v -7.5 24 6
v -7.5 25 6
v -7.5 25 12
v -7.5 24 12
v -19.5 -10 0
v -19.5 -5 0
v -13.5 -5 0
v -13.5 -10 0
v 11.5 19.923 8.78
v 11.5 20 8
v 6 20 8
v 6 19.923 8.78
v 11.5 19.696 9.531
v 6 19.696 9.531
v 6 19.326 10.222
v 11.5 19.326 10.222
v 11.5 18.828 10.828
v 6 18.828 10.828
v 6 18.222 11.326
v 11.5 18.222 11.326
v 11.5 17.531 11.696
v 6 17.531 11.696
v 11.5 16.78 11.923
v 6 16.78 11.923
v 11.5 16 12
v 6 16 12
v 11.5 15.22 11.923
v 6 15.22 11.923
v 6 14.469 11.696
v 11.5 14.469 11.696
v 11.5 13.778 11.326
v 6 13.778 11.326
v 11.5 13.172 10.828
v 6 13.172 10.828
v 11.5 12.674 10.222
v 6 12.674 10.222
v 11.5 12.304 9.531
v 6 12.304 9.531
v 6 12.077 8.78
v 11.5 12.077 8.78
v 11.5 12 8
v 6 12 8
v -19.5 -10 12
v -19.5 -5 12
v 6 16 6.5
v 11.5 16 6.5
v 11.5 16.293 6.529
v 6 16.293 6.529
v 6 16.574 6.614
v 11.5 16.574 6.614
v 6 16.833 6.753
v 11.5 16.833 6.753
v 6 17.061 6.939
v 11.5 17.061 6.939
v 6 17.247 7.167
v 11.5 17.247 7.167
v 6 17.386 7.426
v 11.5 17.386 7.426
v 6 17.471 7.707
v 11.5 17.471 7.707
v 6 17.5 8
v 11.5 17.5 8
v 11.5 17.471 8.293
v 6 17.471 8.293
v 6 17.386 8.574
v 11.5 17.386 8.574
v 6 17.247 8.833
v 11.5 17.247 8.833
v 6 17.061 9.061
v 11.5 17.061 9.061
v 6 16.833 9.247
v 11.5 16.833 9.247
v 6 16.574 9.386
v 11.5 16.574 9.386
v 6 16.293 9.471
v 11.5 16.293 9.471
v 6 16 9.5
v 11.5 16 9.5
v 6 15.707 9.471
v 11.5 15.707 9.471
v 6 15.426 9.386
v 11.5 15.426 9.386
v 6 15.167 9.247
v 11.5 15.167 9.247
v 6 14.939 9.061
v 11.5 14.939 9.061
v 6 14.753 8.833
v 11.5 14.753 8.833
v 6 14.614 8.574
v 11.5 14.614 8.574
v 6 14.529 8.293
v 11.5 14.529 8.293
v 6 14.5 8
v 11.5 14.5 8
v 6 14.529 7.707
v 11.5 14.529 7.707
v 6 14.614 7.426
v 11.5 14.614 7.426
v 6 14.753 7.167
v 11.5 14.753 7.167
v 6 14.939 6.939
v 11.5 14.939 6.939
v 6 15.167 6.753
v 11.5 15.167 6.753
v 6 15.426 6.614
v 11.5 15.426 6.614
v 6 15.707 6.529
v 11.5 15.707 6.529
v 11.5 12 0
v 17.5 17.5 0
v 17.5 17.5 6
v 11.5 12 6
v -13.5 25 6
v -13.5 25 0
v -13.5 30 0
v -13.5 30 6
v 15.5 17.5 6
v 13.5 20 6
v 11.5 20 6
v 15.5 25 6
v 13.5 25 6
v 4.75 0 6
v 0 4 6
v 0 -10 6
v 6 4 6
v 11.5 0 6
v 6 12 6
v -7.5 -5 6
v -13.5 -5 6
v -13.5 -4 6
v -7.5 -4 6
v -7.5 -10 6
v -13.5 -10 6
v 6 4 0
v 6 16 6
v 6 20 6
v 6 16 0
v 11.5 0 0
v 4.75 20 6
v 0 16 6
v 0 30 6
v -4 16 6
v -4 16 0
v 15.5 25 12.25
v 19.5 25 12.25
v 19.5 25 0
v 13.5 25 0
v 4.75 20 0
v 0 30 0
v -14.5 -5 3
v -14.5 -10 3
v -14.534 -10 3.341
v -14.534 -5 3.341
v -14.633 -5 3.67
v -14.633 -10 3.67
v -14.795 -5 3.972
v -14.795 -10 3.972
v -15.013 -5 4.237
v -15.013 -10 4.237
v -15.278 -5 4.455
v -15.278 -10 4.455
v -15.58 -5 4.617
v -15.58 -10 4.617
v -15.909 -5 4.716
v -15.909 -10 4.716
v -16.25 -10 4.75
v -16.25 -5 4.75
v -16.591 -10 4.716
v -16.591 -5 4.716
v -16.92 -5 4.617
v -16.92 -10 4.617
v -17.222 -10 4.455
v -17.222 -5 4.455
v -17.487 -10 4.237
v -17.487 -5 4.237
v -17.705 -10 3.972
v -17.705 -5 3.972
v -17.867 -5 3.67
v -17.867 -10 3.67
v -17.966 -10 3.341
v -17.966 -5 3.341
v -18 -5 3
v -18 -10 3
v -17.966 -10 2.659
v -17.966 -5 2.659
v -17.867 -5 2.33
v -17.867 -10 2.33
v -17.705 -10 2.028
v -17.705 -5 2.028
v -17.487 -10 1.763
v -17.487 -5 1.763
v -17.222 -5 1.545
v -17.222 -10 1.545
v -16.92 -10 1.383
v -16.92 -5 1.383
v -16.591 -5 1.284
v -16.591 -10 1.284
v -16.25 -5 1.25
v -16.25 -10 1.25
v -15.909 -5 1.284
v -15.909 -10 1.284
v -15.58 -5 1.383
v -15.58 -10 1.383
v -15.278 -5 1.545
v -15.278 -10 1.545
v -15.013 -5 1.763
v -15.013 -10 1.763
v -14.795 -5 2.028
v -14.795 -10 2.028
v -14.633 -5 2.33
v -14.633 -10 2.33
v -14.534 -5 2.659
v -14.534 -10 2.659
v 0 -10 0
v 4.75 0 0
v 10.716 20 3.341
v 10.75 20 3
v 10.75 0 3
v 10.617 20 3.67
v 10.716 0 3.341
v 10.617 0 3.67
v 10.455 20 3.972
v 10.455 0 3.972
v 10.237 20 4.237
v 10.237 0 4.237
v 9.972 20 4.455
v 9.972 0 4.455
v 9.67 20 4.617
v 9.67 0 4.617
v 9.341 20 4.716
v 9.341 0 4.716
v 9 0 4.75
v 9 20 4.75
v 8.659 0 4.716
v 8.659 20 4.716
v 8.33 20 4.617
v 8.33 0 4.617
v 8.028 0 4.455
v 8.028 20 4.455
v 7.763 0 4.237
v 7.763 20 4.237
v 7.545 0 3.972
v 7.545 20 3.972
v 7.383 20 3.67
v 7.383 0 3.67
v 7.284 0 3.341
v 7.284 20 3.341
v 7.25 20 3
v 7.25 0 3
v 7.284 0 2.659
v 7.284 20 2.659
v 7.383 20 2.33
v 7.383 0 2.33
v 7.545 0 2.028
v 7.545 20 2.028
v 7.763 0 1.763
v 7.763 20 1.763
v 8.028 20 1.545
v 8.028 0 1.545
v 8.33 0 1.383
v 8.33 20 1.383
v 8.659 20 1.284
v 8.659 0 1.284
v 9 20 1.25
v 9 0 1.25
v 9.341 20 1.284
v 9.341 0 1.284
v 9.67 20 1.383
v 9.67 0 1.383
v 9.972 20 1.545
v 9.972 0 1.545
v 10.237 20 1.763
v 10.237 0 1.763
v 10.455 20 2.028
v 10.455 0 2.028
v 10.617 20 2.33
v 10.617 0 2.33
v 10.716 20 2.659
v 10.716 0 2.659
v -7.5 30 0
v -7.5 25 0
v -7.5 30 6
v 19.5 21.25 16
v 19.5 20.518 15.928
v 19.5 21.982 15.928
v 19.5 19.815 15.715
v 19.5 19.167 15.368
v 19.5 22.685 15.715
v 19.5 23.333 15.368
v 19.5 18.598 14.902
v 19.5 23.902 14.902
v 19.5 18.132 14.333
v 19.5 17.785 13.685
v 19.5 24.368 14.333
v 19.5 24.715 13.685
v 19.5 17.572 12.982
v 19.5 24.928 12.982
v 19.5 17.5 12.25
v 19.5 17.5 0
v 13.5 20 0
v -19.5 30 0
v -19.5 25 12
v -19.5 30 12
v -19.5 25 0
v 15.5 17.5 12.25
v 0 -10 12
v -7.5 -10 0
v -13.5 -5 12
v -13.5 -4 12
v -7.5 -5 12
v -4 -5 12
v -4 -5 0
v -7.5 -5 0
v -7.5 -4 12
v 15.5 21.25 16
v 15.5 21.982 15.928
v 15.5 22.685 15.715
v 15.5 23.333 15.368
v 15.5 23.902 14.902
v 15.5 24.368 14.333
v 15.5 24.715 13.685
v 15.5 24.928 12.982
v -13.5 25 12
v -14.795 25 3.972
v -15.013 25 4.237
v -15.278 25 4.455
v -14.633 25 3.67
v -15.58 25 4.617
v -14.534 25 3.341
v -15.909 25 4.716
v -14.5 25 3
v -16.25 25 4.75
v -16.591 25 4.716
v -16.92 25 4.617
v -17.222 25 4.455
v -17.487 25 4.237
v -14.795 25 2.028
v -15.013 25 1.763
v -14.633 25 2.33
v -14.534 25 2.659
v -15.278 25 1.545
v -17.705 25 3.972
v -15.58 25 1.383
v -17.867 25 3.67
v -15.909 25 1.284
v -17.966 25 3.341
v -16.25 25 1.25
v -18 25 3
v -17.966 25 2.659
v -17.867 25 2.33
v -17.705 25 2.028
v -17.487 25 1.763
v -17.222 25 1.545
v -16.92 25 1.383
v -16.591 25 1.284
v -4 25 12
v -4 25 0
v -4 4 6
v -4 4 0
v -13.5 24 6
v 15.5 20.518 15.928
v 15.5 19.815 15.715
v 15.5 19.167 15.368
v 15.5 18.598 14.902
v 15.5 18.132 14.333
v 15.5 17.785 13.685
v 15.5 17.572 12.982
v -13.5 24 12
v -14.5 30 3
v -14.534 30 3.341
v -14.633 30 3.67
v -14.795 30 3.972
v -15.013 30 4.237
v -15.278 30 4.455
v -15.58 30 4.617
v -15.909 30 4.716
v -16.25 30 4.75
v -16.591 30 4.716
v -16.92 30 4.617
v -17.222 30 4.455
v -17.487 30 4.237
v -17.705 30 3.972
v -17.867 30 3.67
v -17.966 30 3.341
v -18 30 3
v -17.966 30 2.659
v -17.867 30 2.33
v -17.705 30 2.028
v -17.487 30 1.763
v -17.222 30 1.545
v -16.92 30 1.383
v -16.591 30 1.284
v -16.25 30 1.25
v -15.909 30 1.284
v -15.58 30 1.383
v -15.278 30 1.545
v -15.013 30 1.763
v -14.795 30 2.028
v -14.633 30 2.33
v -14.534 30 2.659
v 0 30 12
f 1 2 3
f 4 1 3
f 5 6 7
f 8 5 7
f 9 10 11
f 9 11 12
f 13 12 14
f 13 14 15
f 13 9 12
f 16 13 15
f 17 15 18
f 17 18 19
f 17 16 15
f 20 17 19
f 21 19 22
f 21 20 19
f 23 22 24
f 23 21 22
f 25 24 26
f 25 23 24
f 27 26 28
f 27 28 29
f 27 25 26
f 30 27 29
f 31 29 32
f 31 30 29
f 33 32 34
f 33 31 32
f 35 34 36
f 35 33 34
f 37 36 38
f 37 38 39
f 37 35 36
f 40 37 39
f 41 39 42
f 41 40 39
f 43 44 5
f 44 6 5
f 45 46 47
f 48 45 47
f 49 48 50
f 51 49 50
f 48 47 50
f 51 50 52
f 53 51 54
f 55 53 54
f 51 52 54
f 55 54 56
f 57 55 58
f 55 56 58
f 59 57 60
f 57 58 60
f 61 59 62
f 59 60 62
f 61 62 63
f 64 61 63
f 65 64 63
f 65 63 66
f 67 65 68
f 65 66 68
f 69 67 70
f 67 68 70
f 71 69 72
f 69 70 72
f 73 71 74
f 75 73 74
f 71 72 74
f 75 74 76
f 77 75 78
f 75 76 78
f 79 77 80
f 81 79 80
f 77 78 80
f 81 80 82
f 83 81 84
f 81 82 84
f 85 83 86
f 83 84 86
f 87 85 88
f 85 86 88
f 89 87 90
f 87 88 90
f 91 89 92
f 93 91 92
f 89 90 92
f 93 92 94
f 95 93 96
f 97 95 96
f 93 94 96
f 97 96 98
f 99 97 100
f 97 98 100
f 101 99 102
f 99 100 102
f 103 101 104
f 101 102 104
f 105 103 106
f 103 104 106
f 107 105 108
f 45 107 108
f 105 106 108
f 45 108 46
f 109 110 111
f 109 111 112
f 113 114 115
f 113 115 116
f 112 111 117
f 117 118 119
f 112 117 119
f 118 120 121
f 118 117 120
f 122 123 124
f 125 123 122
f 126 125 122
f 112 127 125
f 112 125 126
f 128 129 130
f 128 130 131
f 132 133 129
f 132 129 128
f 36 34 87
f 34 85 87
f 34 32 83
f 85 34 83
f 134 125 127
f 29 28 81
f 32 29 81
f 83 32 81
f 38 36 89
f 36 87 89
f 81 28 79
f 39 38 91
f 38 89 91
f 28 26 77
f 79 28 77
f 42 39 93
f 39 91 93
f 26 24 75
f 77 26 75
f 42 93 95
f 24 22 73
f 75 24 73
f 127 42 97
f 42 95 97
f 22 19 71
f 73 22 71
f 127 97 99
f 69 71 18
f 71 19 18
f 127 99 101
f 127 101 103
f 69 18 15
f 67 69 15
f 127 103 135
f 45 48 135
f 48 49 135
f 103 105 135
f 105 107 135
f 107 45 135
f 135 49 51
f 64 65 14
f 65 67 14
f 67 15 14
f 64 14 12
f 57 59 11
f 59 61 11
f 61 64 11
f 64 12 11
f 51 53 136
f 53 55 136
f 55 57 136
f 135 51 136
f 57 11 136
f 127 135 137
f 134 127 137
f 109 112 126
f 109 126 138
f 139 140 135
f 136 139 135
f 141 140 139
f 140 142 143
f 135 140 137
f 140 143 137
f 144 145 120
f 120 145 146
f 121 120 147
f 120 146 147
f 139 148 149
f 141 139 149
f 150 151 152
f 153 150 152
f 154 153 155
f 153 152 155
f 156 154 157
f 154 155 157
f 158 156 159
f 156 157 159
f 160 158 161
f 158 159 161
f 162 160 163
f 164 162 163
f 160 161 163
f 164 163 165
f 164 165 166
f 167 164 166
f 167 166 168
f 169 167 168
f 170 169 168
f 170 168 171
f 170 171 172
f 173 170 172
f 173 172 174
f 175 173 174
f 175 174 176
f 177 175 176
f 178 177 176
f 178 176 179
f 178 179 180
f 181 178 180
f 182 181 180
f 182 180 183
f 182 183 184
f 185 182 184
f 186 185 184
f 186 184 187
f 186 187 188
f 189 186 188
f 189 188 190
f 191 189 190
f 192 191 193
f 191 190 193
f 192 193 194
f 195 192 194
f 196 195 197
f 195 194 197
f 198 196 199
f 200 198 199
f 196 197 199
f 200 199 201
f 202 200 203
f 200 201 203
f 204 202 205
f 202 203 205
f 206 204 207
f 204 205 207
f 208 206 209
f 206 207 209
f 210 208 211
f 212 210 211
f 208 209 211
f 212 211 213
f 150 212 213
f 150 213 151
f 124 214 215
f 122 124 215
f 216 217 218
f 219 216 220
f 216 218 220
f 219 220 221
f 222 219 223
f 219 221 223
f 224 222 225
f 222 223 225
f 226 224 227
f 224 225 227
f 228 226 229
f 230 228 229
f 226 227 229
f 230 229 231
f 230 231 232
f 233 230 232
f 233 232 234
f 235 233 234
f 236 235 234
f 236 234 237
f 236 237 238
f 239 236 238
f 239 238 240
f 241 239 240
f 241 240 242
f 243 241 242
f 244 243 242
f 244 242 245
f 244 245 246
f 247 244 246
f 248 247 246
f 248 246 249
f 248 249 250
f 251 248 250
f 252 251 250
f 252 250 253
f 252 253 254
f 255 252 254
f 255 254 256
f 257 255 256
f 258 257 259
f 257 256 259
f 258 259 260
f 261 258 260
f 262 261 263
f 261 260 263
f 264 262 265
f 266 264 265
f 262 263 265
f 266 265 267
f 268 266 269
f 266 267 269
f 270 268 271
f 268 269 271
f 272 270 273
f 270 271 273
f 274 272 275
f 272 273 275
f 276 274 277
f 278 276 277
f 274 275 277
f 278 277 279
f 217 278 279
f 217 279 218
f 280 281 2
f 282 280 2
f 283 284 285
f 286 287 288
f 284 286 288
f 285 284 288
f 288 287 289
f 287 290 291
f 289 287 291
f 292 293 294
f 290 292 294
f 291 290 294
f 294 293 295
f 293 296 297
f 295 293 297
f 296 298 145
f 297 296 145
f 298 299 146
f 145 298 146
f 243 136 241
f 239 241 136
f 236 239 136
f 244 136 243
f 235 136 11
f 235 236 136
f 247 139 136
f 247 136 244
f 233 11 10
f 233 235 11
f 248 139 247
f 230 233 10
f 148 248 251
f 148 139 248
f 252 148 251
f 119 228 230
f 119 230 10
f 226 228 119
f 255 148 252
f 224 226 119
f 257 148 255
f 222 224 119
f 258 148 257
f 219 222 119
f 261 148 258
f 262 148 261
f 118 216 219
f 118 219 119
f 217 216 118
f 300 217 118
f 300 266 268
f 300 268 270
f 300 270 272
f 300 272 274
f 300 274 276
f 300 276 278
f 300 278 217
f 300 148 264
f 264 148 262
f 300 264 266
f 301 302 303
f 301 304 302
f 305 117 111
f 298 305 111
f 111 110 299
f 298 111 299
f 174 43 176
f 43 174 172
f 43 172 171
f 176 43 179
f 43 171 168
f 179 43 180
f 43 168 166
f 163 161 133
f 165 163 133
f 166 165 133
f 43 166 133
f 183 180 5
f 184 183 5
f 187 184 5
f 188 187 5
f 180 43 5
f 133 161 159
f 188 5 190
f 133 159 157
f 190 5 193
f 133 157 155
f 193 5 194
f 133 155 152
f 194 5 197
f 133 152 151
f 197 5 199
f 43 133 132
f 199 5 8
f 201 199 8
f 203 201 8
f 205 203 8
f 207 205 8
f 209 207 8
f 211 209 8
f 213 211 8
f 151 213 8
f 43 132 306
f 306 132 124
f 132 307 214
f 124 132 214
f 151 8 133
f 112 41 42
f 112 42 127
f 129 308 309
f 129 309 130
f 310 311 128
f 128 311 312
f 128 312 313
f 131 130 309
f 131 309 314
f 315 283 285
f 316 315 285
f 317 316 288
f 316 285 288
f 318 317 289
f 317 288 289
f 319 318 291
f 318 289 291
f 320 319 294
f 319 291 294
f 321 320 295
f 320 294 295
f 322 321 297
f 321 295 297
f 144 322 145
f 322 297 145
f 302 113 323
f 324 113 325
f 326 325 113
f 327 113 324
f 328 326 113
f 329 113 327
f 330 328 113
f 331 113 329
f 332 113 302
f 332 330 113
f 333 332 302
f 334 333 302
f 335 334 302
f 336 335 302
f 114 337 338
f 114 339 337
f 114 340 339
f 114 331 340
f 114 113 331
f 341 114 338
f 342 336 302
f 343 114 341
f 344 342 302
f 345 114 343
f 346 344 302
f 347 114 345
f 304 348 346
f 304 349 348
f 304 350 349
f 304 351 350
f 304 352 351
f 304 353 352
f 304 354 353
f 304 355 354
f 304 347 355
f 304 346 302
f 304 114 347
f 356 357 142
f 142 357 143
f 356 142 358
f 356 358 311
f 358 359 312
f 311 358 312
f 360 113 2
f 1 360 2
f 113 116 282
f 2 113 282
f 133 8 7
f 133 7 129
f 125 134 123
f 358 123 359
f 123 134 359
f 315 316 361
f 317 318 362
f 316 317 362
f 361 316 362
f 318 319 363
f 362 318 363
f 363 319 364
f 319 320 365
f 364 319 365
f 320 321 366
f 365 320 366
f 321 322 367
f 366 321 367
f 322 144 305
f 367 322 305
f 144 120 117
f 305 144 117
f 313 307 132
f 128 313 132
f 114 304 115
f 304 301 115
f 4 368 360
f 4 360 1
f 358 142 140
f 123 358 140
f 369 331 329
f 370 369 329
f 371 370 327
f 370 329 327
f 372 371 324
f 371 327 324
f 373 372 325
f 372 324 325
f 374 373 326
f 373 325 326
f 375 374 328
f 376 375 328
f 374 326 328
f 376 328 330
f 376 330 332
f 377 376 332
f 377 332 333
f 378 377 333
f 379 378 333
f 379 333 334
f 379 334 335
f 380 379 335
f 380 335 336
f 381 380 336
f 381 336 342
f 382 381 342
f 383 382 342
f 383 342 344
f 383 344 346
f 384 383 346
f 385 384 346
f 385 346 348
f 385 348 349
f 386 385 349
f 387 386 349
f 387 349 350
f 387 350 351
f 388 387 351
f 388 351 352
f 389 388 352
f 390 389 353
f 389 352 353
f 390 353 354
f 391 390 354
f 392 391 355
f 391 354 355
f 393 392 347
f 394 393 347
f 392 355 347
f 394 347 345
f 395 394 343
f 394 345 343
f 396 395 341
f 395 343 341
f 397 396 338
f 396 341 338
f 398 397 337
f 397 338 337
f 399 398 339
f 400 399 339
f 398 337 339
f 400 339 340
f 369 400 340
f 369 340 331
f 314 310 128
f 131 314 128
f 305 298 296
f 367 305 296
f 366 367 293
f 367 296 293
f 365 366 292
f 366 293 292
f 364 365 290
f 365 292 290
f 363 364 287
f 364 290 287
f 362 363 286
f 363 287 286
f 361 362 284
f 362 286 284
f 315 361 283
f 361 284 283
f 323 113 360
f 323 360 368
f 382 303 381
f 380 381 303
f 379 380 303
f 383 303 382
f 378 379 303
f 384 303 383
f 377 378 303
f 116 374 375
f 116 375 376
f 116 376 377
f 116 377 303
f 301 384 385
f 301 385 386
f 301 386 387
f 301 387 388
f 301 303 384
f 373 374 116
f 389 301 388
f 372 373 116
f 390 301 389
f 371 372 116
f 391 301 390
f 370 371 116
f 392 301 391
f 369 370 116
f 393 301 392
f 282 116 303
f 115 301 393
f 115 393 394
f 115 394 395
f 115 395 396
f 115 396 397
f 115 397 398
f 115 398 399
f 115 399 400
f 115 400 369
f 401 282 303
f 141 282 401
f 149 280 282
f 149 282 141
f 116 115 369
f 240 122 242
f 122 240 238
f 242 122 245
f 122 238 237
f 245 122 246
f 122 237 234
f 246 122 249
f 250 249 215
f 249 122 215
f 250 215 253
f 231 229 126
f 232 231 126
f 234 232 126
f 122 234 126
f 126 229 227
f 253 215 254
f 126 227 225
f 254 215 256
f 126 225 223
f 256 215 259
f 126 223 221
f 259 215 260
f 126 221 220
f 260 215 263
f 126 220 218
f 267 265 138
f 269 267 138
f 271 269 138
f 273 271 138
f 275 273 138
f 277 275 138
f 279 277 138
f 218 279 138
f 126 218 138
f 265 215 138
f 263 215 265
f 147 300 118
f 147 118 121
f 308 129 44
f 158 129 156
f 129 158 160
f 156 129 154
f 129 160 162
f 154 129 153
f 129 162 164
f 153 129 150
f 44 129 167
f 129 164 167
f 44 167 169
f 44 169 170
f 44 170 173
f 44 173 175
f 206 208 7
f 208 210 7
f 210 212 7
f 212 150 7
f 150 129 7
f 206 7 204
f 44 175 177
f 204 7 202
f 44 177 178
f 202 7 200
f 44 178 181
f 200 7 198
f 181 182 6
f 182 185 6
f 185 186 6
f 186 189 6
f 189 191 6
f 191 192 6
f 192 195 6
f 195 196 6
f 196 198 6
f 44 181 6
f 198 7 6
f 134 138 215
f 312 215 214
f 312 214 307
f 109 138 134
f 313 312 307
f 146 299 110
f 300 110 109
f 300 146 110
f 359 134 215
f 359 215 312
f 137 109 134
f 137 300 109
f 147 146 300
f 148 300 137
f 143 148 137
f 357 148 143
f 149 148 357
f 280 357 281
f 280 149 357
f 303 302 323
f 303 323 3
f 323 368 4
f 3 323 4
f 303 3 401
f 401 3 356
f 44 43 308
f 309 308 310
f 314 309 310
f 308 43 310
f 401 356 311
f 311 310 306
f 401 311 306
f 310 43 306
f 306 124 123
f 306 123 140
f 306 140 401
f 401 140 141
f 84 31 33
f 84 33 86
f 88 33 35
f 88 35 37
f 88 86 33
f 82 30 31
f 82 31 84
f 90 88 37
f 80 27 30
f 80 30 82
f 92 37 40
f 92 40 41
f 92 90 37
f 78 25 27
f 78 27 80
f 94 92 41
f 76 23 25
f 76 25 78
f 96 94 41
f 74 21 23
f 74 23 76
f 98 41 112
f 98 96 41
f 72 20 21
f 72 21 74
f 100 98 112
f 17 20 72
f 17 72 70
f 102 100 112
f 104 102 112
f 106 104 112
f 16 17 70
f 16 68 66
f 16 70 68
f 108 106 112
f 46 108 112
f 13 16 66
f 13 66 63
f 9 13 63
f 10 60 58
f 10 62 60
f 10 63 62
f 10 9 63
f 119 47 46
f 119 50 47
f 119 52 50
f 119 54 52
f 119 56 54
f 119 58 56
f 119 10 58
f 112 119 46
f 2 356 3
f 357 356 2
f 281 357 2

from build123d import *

# Parameters (mm, degrees)
BOSS_EXTRUDE1_DEPTH  = 6
SKETCH2_R            = 1.75
CUT_EXTRUDE1_DEPTH   = 41
SKETCH3_R            = 1.5
BOSS_EXTRUDE7_DEPTH  = 5.5
SKETCH4_W            = 4
SKETCH4_H            = 12
BOSS_EXTRUDE8_DEPTH  = 6
SKETCH7_W            = 6
SKETCH7_H            = 6
CUT_EXTRUDE2_DEPTH   = 40
BOSS_EXTRUDE9_DEPTH  = 6
BOSS_EXTRUDE10_DEPTH = 10
CUT_EXTRUDE3_REACH   = 41
SKETCH12_W           = 6
SKETCH12_H           = 6
BOSS_EXTRUDE11_DEPTH = 1
SKETCH13_W           = 6
SKETCH13_H           = 6
BOSS_EXTRUDE12_DEPTH = 1


with BuildPart() as part:
    # Sketch1 → Boss-Extrude1 (new body)
    with BuildSketch(Plane.XY):
        Polygon((6, 4), (-4, 4), (-4, -5), (-19.5, -5), (-19.5, -10), (0, -10), (4.75, 0), (11.5, 0), (11.5, 20), (4.75, 20), (0, 30), (-19.5, 30), (-19.5, 25), (-4, 25), (-4, 16), (6, 16), align=None)
    extrude(amount=BOSS_EXTRUDE1_DEPTH)

    # Sketch2 → Cut-Extrude1 (cut, through all)
    with BuildSketch(Plane.XZ.offset(10)):
        with Locations((9, 3)):
            Circle(SKETCH2_R)
        with Locations((-16.25, 3)):
            Circle(SKETCH2_R)
    extrude(amount=-CUT_EXTRUDE1_DEPTH, mode=Mode.SUBTRACT)

    # Sketch3 → Boss-Extrude7 (add)
    with BuildSketch(Plane(origin=(11.5, 0, 0), x_dir=(0, 0, -1), z_dir=(1, 0, 0))):
        with BuildLine():
            Line((-8, 12), (-6, 12))
            Line((-6, 12), (-6, 20))
            Line((-6, 20), (-8, 20))
            ThreePointArc((-8, 20), (-12, 16), (-8, 12))
        make_face()
        with Locations((-8, 16)):
            Circle(SKETCH3_R, mode=Mode.SUBTRACT)
    extrude(amount=-BOSS_EXTRUDE7_DEPTH)

    # Sketch4 → Boss-Extrude8 (add)
    with BuildSketch(Plane.XY.offset(6)):
        with Locations((-2, 10)):
            Rectangle(SKETCH4_W, SKETCH4_H)
        Polygon((-4, 16), (-4, 25), (-19.5, 25), (-19.5, 30), (0, 30), (0, 24), (0, 16), align=None)
        Polygon((-19.5, -5), (-19.5, -10), (0, -10), (0, 4), (-4, 4), (-4, -5), align=None)
    extrude(amount=BOSS_EXTRUDE8_DEPTH)

    # Sketch7 → Cut-Extrude2 (cut)
    with BuildSketch(Plane.XZ.offset(10)):
        with Locations((-10.5, 3)):
            Rectangle(SKETCH7_W, SKETCH7_H)
    extrude(amount=-CUT_EXTRUDE2_DEPTH, mode=Mode.SUBTRACT)

    # Sketch9 → Boss-Extrude9 (add)
    with BuildSketch(Plane(origin=(0, 0, 0), x_dir=(-1, 0, 0), z_dir=(0, 0, -1))):
        Polygon((-17.5, 17.5), (-11.5, 12), (-11.5, 20), (-13.5, 20), (-13.5, 25), (-19.5, 25), (-19.5, 20), (-19.5, 17.5), align=None)
    extrude(amount=-BOSS_EXTRUDE9_DEPTH)

    # Sketch10 → Boss-Extrude10 (add)
    with BuildSketch(Plane.XY.offset(6)):
        Polygon((19.5, 25), (15.5, 25), (15.5, 17.5), (17, 17.5), (17.5, 17.5), (19.5, 17.5), align=None)
    extrude(amount=BOSS_EXTRUDE10_DEPTH)

    # Sketch11 → Cut-Extrude3 (cut, up to next)
    with BuildSketch(Plane(origin=(19.5, 0, 0), x_dir=(0, 0, -1), z_dir=(1, 0, 0)), mode=Mode.PRIVATE) as cut_extrude3_sk1:
        with BuildLine():
            Line((-12.25, 25), (-16, 25))
            Line((-16, 25), (-16, 21.25))
            ThreePointArc((-16, 21.25), (-14.901650429, 23.901650429), (-12.25, 25))
        make_face()
    cut_extrude3_tool1 = extrude(cut_extrude3_sk1.sketch, amount=-CUT_EXTRUDE3_REACH, mode=Mode.PRIVATE) & part.part
    add(cut_extrude3_tool1.solids().sort_by_distance((19.5, 24.16237, 15.16237))[0], mode=Mode.SUBTRACT)
    # Sketch11 → Cut-Extrude3 (cut, up to next)
    with BuildSketch(Plane(origin=(19.5, 0, 0), x_dir=(0, 0, -1), z_dir=(1, 0, 0)), mode=Mode.PRIVATE) as cut_extrude3_sk2:
        with BuildLine():
            ThreePointArc((-12.25, 17.5), (-14.901650429, 18.598349571), (-16, 21.25))
            Line((-16, 21.25), (-16, 17.5))
            Line((-16, 17.5), (-12.25, 17.5))
        make_face()
    cut_extrude3_tool2 = extrude(cut_extrude3_sk2.sketch, amount=-CUT_EXTRUDE3_REACH, mode=Mode.PRIVATE) & part.part
    add(cut_extrude3_tool2.solids().sort_by_distance((19.5, 18.33763, 15.16237))[0], mode=Mode.SUBTRACT)

    # Sketch12 → Boss-Extrude11 (add)
    with BuildSketch(Plane.XZ.offset(-25)):
        with Locations((-10.5, 9)):
            Rectangle(SKETCH12_W, SKETCH12_H)
    extrude(amount=BOSS_EXTRUDE11_DEPTH)

    # Sketch13 → Boss-Extrude12 (add)
    with BuildSketch(Plane(origin=(0, -5, 0), x_dir=(1, 0, 0), z_dir=(0, 1, 0))):
        with Locations((-10.5, -9)):
            Rectangle(SKETCH13_W, SKETCH13_H)
    extrude(amount=BOSS_EXTRUDE12_DEPTH)


solid = part.part
